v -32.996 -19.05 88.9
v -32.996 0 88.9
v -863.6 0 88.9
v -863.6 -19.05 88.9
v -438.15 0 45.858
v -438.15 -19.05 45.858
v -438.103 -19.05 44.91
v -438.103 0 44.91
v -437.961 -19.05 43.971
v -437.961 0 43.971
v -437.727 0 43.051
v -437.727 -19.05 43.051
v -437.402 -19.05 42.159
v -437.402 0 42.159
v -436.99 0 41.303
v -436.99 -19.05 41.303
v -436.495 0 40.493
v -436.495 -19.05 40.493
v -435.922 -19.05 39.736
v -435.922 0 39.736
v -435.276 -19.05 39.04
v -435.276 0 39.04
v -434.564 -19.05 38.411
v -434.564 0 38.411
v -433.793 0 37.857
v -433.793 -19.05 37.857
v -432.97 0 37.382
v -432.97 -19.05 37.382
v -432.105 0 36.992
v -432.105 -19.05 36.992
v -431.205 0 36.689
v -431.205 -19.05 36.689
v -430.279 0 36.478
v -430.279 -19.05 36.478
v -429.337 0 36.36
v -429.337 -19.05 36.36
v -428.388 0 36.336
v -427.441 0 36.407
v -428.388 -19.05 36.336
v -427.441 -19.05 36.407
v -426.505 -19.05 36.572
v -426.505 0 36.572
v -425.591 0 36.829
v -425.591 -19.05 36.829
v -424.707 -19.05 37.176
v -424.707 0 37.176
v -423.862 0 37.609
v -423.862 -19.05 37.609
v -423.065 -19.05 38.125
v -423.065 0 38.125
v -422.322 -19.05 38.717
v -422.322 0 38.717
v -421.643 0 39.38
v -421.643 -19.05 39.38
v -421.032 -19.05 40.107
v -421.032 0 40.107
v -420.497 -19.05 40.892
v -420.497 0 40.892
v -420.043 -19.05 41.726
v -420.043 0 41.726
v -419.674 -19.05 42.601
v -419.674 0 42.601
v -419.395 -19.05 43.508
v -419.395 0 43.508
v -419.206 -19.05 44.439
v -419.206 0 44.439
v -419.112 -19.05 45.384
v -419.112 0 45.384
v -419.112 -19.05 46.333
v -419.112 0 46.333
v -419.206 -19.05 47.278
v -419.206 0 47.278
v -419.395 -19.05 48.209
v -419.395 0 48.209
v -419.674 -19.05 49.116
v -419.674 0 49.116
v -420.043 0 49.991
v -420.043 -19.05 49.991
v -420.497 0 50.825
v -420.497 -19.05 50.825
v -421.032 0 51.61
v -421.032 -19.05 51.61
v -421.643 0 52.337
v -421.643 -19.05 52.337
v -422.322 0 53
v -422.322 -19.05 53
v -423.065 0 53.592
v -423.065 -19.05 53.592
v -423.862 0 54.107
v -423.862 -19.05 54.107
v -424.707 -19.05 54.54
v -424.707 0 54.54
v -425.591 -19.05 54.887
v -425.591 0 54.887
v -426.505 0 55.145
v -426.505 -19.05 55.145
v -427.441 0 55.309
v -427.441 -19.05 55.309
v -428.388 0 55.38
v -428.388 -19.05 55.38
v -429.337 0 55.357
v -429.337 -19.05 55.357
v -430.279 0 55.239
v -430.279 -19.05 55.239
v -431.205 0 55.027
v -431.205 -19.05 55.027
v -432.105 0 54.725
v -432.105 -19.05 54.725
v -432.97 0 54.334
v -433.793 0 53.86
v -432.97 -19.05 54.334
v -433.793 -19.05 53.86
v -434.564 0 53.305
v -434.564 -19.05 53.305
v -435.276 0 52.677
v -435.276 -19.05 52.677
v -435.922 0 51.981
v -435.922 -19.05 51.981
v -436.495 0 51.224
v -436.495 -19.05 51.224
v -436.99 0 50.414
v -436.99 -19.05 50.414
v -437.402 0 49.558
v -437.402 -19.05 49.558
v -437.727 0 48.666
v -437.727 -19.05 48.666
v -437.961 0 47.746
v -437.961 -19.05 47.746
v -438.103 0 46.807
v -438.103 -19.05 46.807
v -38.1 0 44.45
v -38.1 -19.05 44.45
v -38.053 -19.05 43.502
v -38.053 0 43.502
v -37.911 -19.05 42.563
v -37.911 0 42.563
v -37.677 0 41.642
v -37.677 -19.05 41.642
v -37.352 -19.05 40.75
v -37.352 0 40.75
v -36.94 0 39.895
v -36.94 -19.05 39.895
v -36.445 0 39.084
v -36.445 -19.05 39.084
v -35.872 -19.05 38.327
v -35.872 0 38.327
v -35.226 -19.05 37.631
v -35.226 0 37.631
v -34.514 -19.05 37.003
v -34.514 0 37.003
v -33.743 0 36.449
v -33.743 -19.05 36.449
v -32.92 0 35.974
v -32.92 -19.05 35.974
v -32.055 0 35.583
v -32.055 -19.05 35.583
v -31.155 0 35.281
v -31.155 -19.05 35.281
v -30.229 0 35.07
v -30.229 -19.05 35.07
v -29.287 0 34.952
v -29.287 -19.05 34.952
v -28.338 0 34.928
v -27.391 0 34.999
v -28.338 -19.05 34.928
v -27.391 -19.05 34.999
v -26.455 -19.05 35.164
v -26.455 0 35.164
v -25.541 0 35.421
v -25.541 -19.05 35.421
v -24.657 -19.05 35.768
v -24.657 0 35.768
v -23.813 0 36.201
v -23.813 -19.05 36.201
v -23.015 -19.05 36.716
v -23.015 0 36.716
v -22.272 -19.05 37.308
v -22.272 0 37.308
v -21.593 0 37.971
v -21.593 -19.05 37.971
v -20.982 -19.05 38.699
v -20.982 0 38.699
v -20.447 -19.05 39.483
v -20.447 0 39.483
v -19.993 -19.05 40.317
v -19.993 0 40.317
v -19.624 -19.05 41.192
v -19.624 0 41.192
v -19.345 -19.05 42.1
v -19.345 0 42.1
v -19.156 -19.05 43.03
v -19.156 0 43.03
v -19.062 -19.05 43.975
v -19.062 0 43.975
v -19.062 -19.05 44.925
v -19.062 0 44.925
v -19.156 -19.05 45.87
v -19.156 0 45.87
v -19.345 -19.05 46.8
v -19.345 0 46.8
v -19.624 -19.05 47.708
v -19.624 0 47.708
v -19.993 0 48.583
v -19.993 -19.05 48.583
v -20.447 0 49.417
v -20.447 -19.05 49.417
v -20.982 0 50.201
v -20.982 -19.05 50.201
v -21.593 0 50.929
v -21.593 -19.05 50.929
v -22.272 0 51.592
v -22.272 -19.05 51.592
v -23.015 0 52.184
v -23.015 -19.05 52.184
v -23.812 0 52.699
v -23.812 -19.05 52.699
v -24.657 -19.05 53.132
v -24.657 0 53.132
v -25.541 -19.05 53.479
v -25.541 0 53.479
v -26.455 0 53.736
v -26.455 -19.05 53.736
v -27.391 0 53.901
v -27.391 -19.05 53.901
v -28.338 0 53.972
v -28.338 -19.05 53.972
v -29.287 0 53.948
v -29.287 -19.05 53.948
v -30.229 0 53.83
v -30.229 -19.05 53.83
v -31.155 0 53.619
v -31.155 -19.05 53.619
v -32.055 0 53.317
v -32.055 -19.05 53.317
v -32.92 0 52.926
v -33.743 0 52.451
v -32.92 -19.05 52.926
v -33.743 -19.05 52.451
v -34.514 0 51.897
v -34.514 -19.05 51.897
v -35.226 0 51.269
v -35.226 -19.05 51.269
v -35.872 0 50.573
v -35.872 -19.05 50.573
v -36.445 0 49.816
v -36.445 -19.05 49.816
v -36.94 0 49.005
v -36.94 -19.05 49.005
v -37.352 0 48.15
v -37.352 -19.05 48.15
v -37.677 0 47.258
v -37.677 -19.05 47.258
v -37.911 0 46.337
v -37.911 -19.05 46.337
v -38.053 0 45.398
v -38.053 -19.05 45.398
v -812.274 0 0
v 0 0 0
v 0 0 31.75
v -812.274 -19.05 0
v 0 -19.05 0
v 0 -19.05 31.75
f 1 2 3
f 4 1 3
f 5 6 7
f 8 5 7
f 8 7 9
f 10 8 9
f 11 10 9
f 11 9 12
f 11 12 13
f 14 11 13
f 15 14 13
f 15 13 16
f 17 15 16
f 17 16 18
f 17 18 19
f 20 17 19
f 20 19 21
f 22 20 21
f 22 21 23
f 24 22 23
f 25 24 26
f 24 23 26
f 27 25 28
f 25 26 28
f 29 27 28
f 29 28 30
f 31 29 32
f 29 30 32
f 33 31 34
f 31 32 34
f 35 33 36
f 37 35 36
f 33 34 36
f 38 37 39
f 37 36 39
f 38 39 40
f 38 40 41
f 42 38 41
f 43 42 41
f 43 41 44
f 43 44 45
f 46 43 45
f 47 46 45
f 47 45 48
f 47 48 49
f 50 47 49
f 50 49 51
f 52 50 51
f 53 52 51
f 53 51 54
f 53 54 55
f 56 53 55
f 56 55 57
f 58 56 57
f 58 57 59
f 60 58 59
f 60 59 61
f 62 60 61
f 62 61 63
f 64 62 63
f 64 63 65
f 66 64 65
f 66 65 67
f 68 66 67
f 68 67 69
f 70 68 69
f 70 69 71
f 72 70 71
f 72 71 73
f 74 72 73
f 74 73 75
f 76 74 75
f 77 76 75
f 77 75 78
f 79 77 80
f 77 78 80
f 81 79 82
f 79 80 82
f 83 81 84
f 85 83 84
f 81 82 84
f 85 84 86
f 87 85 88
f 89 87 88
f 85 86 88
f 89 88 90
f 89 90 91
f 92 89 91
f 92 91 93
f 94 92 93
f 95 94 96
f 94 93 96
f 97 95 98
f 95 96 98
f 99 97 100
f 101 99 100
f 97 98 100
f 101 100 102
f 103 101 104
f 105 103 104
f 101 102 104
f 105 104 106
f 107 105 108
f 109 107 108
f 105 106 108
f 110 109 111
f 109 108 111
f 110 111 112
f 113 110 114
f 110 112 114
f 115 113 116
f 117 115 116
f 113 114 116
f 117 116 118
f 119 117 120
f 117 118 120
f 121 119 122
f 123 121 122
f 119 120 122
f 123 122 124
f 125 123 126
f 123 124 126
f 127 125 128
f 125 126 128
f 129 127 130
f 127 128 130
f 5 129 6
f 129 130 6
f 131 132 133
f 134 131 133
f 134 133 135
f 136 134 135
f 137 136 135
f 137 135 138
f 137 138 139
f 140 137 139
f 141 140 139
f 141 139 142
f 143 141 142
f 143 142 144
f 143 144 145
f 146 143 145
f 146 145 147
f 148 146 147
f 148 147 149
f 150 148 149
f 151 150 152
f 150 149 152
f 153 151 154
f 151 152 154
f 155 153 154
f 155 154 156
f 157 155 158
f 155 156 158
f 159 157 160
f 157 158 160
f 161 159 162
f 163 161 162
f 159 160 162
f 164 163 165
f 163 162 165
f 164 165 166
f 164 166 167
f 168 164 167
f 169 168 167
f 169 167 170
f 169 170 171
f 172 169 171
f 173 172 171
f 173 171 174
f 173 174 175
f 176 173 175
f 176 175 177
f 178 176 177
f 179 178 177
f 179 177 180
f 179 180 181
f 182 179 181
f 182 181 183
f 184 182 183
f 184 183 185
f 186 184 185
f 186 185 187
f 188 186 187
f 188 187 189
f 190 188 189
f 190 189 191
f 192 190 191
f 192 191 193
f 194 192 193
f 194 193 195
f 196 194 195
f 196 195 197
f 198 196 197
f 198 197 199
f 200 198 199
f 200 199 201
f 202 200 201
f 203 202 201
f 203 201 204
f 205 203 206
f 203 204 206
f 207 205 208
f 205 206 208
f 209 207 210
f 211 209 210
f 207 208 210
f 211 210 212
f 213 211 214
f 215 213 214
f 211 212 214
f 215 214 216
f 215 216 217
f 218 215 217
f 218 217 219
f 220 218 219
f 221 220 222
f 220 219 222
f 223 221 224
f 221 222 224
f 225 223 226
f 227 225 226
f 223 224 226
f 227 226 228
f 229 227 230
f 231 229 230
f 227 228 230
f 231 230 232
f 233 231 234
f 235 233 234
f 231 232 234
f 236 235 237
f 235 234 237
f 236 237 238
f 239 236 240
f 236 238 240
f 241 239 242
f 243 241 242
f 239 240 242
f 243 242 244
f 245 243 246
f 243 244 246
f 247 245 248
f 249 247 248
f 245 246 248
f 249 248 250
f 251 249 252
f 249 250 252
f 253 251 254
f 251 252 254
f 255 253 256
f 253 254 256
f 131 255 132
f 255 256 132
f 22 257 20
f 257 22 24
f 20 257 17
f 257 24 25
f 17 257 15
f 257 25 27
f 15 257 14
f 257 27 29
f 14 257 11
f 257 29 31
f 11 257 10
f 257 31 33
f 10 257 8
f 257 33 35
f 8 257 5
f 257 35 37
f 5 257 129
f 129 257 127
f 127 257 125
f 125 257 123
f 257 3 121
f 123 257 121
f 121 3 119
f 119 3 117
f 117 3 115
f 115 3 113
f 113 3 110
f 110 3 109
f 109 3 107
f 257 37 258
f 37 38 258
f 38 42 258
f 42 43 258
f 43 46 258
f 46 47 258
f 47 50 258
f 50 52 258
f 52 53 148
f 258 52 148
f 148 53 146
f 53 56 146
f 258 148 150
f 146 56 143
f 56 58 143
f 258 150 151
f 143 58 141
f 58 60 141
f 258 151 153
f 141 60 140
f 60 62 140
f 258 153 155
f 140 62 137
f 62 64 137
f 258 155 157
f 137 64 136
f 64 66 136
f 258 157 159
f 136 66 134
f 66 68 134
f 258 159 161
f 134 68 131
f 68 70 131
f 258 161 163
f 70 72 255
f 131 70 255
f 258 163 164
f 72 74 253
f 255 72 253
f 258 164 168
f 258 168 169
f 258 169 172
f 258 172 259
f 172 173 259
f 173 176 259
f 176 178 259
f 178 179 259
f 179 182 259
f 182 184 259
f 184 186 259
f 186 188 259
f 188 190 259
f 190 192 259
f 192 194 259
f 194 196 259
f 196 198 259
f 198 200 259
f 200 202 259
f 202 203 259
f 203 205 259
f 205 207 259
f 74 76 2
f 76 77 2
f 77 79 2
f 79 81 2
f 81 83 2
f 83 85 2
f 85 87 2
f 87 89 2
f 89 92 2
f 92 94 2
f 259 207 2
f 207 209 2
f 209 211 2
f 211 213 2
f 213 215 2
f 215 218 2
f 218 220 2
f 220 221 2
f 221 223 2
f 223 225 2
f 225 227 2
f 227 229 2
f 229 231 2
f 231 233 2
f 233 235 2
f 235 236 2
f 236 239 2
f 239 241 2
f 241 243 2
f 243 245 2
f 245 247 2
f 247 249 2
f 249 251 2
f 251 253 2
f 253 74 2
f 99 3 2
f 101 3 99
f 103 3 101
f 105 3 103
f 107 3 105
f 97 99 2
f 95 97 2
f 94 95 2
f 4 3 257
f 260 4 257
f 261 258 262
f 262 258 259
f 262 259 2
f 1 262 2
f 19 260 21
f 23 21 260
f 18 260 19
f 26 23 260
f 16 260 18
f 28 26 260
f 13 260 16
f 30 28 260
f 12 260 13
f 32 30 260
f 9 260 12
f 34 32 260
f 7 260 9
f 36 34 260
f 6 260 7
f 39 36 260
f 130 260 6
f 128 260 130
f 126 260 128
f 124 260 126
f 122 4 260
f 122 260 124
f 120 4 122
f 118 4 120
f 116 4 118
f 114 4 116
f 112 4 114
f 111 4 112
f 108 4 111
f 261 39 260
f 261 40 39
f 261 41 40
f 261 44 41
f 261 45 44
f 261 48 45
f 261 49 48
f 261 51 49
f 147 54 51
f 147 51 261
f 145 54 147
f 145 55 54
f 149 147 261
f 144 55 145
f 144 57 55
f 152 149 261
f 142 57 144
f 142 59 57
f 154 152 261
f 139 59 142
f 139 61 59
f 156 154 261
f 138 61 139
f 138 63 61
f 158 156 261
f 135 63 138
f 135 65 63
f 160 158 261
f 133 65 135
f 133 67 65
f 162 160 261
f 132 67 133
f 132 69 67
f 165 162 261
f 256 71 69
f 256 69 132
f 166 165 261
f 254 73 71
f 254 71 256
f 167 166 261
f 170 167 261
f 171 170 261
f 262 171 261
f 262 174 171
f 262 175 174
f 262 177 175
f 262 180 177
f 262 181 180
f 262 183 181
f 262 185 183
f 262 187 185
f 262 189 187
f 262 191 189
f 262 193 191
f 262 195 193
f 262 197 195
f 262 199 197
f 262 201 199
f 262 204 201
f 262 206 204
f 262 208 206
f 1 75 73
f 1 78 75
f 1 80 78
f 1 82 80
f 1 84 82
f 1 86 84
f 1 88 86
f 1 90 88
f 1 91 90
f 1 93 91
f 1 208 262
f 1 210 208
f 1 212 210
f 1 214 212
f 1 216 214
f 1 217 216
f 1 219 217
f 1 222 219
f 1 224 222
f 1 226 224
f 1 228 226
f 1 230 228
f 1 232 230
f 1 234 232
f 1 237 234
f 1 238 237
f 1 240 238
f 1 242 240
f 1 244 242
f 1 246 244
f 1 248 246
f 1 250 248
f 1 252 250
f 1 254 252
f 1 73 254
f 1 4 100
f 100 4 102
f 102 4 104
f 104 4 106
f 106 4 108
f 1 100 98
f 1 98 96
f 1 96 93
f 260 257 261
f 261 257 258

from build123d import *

# Parameters (mm, degrees)
F1_DEPTH = 19.05
F3_D     = 19.05
F5_D     = 19.05


with BuildPart() as f1:
    # F0 (on Front) → F1 (new body)
    with BuildSketch(Plane.XZ):
        Polygon((-812.273561069, 0), (0, 0), (0, 31.75), (-32.9955678842, 88.9), (-863.6, 88.9), align=None)
    extrude(amount=F1_DEPTH)

    # F3 (through all)
    with Locations(Plane(origin=(0, 0, 0), x_dir=(1, 0, 0), z_dir=(0, 1, 0))):
        with Locations((-28.575, -44.45)):
            Hole(F3_D / 2)

    # F5 (through all)
    with Locations(Plane(origin=(0, 0, 0), x_dir=(1, 0, 0), z_dir=(0, 1, 0))):
        with Locations((-428.625, -45.8583533764)):
            Hole(F5_D / 2)


solid = f1.part
